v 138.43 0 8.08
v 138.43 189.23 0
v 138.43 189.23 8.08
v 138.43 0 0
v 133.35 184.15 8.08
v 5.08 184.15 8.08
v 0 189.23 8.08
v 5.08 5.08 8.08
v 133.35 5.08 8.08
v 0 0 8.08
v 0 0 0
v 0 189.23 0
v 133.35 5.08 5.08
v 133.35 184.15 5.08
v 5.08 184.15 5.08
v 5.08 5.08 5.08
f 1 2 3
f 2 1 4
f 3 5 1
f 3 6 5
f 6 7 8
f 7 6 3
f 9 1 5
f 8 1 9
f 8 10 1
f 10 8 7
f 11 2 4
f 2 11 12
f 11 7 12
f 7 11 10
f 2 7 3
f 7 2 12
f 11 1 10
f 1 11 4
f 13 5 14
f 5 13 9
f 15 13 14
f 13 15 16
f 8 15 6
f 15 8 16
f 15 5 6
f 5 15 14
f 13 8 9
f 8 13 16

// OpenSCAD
inch = 25.4;

picture_x = 5.05 * inch;
picture_y = 7.05 * inch;
picture_z = 3;

wall_thickness = .2 * inch;

frame_x = picture_x + (wall_thickness * 2);
frame_y = picture_y + (wall_thickness * 2);
frame_z = picture_z + wall_thickness;

difference() {
    cube([frame_x, frame_y, frame_z]);
    translate([wall_thickness, wall_thickness, wall_thickness]) {
        cube([picture_x, picture_y, picture_z]);
    }
}     
